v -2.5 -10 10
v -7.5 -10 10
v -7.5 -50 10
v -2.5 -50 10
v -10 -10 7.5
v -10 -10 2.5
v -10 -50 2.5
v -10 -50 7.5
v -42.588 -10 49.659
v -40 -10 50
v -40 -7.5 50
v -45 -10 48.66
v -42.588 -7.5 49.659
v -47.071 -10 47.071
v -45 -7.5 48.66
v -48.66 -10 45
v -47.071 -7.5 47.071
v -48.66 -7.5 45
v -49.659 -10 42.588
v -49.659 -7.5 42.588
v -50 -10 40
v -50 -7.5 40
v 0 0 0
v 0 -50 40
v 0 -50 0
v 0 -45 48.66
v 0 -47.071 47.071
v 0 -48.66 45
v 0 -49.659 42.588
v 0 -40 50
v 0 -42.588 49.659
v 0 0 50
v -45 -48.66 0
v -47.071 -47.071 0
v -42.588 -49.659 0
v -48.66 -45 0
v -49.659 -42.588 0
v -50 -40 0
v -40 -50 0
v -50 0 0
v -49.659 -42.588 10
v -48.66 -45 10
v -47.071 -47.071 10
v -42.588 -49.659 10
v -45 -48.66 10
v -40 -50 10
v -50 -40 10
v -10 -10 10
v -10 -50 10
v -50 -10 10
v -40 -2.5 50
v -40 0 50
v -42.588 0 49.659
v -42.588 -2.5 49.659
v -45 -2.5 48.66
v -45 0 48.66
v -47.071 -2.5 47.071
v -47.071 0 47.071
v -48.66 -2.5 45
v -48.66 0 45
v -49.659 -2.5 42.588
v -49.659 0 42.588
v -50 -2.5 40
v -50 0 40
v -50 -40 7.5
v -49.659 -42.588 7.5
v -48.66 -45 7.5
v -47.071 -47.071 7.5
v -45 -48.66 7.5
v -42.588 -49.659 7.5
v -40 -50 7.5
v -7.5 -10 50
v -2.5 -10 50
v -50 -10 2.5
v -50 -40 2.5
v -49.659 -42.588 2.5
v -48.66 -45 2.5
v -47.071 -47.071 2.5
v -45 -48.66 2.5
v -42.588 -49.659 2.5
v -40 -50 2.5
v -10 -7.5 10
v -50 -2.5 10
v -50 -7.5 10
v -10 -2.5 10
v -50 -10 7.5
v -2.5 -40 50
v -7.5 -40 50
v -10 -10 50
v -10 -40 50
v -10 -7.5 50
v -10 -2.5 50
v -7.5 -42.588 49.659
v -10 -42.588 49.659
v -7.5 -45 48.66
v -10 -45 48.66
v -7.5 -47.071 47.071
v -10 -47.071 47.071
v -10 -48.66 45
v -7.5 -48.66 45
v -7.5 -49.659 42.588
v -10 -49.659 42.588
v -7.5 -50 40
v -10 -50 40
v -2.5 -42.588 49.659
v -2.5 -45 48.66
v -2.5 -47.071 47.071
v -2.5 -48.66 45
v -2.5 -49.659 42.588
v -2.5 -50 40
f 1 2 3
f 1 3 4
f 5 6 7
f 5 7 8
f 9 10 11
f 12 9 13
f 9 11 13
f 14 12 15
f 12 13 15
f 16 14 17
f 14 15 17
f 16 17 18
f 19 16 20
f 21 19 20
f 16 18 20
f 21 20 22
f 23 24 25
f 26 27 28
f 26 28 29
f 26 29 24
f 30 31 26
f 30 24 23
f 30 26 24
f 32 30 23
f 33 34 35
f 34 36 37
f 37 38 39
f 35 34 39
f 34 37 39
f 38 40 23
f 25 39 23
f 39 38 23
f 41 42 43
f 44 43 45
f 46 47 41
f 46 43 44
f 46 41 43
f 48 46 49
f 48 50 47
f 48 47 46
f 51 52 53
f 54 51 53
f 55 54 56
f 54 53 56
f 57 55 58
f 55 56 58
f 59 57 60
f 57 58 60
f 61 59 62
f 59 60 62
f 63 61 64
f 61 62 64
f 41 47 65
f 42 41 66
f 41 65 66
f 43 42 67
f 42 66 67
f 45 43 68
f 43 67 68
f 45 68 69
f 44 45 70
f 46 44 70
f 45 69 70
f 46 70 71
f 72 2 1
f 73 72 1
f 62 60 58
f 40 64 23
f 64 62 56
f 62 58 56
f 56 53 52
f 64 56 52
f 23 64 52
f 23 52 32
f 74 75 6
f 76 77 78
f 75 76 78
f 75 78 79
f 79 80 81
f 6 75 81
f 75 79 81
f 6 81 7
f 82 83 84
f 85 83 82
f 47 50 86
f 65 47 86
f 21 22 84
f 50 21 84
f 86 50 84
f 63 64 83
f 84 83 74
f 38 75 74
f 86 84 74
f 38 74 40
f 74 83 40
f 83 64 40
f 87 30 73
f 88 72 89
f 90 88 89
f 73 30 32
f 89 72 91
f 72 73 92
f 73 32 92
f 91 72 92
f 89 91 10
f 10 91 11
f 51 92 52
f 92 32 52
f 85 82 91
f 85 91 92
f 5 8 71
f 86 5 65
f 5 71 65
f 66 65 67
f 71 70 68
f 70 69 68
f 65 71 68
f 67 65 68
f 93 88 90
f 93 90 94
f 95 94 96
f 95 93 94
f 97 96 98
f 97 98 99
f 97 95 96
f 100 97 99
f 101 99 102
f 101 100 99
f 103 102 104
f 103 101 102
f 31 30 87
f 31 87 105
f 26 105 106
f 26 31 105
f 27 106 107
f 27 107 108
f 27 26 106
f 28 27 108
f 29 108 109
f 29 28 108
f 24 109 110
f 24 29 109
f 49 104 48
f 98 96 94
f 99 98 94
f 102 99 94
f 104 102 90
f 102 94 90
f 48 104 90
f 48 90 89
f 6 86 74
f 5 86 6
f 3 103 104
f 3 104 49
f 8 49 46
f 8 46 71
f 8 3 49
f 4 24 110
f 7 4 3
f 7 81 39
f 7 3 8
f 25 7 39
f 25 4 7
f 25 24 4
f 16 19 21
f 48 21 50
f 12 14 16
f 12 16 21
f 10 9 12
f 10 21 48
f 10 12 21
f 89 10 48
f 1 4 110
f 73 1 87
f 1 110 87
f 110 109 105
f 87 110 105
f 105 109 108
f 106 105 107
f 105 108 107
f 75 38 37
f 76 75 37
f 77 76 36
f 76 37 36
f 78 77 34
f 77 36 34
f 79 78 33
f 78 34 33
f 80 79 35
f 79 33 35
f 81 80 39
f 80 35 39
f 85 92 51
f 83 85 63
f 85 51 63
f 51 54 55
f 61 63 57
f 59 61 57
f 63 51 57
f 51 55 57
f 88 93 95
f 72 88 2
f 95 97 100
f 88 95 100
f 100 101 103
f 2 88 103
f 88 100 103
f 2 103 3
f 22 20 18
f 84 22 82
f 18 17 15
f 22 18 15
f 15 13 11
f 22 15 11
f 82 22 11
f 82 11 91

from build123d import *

# Parameters (mm, degrees)
F1_DEPTH = 10
F3_DEPTH = 10
F5_DEPTH = 10
F6_W     = 20
F6_H     = 5
F6_W_2   = 5
F6_H_2   = 30
F6_H_3   = 20
F7_DEPTH = 40
F8_W     = 30
F8_H     = 5
F8_W_2   = 20
F9_DEPTH = 40


# Not quite as in the source:
# - a feature names something its author has since deleted; it is built from what else it names


with BuildPart() as f1:
    # F0 (on Top) → F1 (new body)
    with BuildSketch(Plane.XY):
        with BuildLine():
            Line((0, -50), (0, 0))
            Line((0, 0), (-50, 0))
            Line((-50, 0), (-50, -40))
            ThreePointArc((-50, -40), (-47.0710678119, -47.0710678119), (-40, -50))
            Line((-40, -50), (0, -50))
        make_face()
    extrude(amount=F1_DEPTH)

    # F2 (on Right) → F3 (join)
    with BuildSketch(Plane.YZ):
        with BuildLine():
            Line((-50, 10), (0, 10))
            Line((0, 10), (0, 50))
            Line((0, 50), (-40, 50))
            ThreePointArc((-40, 50), (-47.0710678119, 47.0710678119), (-50, 40))
            Line((-50, 40), (-50, 10))
        make_face()
    extrude(amount=-F3_DEPTH)

    # F4 (on Front) → F5 (join)
    with BuildSketch(Plane.XZ):
        with BuildLine():
            Line((-50, 10), (-10, 10))
            Line((-10, 10), (-10, 50))
            Line((-10, 50), (-40, 50))
            ThreePointArc((-40, 50), (-47.0710678119, 47.0710678119), (-50, 40))
            Line((-50, 40), (-50, 10))
        make_face()
    extrude(amount=F5_DEPTH)

    # F6 (on face) → F7 (cut)
    with BuildSketch(Plane.XZ.offset(50)):
        Polygon((-15, 2.5), (-10, 2.5), (-10, 7.5), (-40, 7.5), (-40, 2.5), align=None)
        with Locations((-50, 5)):
            Rectangle(F6_W, F6_H)
        with Locations((-5, 25)):
            Rectangle(F6_W_2, F6_H_2)
        with Locations((-5, 50)):
            Rectangle(F6_W_2, F6_H_3)
    extrude(amount=-F7_DEPTH, mode=Mode.SUBTRACT)

    # F8 (on face) → F9 (cut)
    with BuildSketch(Plane.XY.offset(50)):
        with Locations((-25, -5)):
            Rectangle(F8_W, F8_H)
        with Locations((-50, -5)):
            Rectangle(F8_W_2, F8_H)
    extrude(amount=-F9_DEPTH, mode=Mode.SUBTRACT)


solid = f1.part
